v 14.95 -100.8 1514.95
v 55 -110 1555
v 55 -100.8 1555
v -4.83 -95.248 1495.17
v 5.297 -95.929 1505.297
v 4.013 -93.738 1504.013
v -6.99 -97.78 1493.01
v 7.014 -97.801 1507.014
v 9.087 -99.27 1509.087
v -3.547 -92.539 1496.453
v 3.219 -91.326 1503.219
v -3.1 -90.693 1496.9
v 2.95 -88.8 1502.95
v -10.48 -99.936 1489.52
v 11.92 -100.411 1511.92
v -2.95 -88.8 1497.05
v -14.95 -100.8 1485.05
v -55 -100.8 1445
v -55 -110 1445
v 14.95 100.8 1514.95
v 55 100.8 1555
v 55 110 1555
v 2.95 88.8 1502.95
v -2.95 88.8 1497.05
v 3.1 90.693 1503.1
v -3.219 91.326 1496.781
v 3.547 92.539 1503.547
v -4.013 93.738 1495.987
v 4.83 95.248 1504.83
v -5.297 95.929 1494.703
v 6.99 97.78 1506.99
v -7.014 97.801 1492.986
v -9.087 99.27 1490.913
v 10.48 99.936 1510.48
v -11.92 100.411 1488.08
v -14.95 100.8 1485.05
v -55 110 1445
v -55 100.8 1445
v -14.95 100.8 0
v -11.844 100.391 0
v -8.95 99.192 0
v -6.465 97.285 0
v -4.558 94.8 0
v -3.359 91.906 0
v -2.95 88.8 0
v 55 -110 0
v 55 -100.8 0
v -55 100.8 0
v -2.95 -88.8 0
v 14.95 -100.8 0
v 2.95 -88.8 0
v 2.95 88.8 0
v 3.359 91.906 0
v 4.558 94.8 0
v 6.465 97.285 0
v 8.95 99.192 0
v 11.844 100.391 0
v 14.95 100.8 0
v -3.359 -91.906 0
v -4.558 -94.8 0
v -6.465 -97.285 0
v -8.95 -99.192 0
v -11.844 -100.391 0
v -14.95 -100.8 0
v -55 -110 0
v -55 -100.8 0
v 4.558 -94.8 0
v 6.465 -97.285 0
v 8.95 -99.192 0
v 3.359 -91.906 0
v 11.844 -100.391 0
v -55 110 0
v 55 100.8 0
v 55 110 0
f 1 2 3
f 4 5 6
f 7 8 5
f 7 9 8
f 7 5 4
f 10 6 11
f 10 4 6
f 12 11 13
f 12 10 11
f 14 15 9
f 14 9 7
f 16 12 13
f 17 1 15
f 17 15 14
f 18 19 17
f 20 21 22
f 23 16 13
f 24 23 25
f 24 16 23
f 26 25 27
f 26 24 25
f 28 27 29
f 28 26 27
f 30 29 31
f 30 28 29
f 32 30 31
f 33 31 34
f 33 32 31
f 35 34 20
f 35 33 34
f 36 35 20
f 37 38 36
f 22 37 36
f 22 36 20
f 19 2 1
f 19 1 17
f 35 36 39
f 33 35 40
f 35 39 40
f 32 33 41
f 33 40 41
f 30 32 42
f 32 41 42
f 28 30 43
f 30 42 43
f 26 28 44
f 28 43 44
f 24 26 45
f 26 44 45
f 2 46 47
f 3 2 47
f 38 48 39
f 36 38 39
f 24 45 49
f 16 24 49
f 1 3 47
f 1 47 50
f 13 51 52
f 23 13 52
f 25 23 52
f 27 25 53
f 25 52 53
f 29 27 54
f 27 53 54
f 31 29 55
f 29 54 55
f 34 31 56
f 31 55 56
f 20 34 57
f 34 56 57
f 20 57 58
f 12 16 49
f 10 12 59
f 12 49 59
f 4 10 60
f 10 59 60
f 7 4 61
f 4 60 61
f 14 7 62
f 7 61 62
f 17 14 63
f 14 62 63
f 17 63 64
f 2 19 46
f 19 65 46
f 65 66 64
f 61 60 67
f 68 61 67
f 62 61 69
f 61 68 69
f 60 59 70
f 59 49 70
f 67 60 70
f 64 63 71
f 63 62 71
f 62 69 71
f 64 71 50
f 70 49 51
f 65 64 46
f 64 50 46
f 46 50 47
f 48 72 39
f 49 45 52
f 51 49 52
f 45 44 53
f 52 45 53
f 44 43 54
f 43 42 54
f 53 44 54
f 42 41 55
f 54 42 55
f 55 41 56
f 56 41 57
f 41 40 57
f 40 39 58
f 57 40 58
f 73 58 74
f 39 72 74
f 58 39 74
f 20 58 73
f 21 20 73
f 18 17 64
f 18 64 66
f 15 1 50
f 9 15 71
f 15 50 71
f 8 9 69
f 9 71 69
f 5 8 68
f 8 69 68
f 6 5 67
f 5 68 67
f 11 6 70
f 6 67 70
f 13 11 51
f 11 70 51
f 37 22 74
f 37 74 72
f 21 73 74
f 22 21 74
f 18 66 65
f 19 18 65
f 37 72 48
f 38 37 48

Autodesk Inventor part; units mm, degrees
ref_plane "Start plane" through (0, 0, 0) normal (0, 0, 1) x (1, 0, 0)
ref_plane "End plane" through (0, 0, 1555) normal (0, 0, 1) x (1, 0, 0)
sketch "Sketch2" plane through (0, 0, 0) normal (0, 0, 1) x (1, 0, 0)
  line L0 (-55, 100.8) -> (-14.95, 100.8)
  line L1 (-55, 110) -> (-55, 100.8)
  line L2 (55, 110) -> (-55, 110)
  line L3 (55, 100.8) -> (55, 110)
  line L4 (14.95, 100.8) -> (55, 100.8)
  line L5 (2.95, -88.8) -> (2.95, 88.8)
  line L6 (55, -100.8) -> (14.95, -100.8)
  line L7 (55, -110) -> (55, -100.8)
  line L8 (-55, -100.8) -> (-55, -110)
  line L9 (-14.95, -100.8) -> (-55, -100.8)
  line L10 (-2.95, 88.8) -> (-2.95, -88.8)
  line L11 (0, -154) -> (0, 154) construction
  line L12 (-2.95, -100.8) -> (2.95, -100.8) construction
  arc A0 (-14.95, -100.8) -> (-2.95, -88.8) centre (-14.95, -88.8) ccw
  arc A1 (-2.95, 88.8) -> (-14.95, 100.8) centre (-14.95, 88.8) ccw
  arc A2 (14.95, 100.8) -> (2.95, 88.8) centre (14.95, 88.8) ccw
  arc A3 (2.95, -88.8) -> (14.95, -100.8) centre (14.95, -88.8) ccw
  line L13 (-77, 0) -> (77, 0) construction
  line L14 (-55, -110) -> (55, -110)
  point P0 (-2.95, 100.8)
  point P1 (2.95, 100.8)
  point P2 (0, 0)
  point P3 (0, -100.8)
  point P4 (0, 0)
  dimension "d1" = 220
  dimension "d3" = 9.2
  dimension "d5" = 5.9
  dimension "d7" = 110
  dimension "d13" = 12
  dimension "d14" = 110
  dimension "d15" = 55
extrude "Body" add sketch "Sketch2" along normal up to surface (1555 mm away) from surface at 0
sketch "Sketch3" plane through (0, 0, 0) normal (0, 0, 1) x (1, 0, 0)
  line L0 (0, 0) -> (10, 0)
ref_plane "Work Plane3" through (0, 0, 0) normal (0, -1, 0) x (1, 0, 0)
ref_plane "Work Plane4" through (55, 0, 1555) normal (-0.7071, 0, 0.7071) x (0.7071, 0, 0.7071)
split "Split1" plane through (55, 0, 1555) removes the side toward (-0.7071, 0, 0.7071)
sketch "Sketch4" plane through (0, 0, 0) normal (0, -1, 0) x (1, 0, 0)
  line L0 (-2, 0) -> (12, 0) projected
  line L1 (-2, 1555) -> (12, 1555) projected
  dimension "d19" = 1555
equation "\"d1\" = ParH"
equation "\"d3\" = t2"
equation "\"d5\" = t1"
equation "\"d7\" = b"
equation "\"d13\" = R1"
equation "\"d14\" = 0.5 * d1"
equation "\"d15\" = 0.5 * d7"
equation "\"d8\" = G_L"
equation "\"b\" = 110"
equation "\"ParH\" = 220"
equation "\"R1\" = 12"
equation "\"G_L\" = d19"
equation "\"t1\" = 5.9"
equation "\"t2\" = 9.2"
equation "\"G_OFFSET_START\" = 0"
equation "\"G_OFFSET_END\" = 55"
equation "\"d17\" = G_OFFSET_END + B_L"
equation "\"B_L\" = 1500"
properties part number "DIN 1025 - IPE 220-1555" material "Steel, Mild"
